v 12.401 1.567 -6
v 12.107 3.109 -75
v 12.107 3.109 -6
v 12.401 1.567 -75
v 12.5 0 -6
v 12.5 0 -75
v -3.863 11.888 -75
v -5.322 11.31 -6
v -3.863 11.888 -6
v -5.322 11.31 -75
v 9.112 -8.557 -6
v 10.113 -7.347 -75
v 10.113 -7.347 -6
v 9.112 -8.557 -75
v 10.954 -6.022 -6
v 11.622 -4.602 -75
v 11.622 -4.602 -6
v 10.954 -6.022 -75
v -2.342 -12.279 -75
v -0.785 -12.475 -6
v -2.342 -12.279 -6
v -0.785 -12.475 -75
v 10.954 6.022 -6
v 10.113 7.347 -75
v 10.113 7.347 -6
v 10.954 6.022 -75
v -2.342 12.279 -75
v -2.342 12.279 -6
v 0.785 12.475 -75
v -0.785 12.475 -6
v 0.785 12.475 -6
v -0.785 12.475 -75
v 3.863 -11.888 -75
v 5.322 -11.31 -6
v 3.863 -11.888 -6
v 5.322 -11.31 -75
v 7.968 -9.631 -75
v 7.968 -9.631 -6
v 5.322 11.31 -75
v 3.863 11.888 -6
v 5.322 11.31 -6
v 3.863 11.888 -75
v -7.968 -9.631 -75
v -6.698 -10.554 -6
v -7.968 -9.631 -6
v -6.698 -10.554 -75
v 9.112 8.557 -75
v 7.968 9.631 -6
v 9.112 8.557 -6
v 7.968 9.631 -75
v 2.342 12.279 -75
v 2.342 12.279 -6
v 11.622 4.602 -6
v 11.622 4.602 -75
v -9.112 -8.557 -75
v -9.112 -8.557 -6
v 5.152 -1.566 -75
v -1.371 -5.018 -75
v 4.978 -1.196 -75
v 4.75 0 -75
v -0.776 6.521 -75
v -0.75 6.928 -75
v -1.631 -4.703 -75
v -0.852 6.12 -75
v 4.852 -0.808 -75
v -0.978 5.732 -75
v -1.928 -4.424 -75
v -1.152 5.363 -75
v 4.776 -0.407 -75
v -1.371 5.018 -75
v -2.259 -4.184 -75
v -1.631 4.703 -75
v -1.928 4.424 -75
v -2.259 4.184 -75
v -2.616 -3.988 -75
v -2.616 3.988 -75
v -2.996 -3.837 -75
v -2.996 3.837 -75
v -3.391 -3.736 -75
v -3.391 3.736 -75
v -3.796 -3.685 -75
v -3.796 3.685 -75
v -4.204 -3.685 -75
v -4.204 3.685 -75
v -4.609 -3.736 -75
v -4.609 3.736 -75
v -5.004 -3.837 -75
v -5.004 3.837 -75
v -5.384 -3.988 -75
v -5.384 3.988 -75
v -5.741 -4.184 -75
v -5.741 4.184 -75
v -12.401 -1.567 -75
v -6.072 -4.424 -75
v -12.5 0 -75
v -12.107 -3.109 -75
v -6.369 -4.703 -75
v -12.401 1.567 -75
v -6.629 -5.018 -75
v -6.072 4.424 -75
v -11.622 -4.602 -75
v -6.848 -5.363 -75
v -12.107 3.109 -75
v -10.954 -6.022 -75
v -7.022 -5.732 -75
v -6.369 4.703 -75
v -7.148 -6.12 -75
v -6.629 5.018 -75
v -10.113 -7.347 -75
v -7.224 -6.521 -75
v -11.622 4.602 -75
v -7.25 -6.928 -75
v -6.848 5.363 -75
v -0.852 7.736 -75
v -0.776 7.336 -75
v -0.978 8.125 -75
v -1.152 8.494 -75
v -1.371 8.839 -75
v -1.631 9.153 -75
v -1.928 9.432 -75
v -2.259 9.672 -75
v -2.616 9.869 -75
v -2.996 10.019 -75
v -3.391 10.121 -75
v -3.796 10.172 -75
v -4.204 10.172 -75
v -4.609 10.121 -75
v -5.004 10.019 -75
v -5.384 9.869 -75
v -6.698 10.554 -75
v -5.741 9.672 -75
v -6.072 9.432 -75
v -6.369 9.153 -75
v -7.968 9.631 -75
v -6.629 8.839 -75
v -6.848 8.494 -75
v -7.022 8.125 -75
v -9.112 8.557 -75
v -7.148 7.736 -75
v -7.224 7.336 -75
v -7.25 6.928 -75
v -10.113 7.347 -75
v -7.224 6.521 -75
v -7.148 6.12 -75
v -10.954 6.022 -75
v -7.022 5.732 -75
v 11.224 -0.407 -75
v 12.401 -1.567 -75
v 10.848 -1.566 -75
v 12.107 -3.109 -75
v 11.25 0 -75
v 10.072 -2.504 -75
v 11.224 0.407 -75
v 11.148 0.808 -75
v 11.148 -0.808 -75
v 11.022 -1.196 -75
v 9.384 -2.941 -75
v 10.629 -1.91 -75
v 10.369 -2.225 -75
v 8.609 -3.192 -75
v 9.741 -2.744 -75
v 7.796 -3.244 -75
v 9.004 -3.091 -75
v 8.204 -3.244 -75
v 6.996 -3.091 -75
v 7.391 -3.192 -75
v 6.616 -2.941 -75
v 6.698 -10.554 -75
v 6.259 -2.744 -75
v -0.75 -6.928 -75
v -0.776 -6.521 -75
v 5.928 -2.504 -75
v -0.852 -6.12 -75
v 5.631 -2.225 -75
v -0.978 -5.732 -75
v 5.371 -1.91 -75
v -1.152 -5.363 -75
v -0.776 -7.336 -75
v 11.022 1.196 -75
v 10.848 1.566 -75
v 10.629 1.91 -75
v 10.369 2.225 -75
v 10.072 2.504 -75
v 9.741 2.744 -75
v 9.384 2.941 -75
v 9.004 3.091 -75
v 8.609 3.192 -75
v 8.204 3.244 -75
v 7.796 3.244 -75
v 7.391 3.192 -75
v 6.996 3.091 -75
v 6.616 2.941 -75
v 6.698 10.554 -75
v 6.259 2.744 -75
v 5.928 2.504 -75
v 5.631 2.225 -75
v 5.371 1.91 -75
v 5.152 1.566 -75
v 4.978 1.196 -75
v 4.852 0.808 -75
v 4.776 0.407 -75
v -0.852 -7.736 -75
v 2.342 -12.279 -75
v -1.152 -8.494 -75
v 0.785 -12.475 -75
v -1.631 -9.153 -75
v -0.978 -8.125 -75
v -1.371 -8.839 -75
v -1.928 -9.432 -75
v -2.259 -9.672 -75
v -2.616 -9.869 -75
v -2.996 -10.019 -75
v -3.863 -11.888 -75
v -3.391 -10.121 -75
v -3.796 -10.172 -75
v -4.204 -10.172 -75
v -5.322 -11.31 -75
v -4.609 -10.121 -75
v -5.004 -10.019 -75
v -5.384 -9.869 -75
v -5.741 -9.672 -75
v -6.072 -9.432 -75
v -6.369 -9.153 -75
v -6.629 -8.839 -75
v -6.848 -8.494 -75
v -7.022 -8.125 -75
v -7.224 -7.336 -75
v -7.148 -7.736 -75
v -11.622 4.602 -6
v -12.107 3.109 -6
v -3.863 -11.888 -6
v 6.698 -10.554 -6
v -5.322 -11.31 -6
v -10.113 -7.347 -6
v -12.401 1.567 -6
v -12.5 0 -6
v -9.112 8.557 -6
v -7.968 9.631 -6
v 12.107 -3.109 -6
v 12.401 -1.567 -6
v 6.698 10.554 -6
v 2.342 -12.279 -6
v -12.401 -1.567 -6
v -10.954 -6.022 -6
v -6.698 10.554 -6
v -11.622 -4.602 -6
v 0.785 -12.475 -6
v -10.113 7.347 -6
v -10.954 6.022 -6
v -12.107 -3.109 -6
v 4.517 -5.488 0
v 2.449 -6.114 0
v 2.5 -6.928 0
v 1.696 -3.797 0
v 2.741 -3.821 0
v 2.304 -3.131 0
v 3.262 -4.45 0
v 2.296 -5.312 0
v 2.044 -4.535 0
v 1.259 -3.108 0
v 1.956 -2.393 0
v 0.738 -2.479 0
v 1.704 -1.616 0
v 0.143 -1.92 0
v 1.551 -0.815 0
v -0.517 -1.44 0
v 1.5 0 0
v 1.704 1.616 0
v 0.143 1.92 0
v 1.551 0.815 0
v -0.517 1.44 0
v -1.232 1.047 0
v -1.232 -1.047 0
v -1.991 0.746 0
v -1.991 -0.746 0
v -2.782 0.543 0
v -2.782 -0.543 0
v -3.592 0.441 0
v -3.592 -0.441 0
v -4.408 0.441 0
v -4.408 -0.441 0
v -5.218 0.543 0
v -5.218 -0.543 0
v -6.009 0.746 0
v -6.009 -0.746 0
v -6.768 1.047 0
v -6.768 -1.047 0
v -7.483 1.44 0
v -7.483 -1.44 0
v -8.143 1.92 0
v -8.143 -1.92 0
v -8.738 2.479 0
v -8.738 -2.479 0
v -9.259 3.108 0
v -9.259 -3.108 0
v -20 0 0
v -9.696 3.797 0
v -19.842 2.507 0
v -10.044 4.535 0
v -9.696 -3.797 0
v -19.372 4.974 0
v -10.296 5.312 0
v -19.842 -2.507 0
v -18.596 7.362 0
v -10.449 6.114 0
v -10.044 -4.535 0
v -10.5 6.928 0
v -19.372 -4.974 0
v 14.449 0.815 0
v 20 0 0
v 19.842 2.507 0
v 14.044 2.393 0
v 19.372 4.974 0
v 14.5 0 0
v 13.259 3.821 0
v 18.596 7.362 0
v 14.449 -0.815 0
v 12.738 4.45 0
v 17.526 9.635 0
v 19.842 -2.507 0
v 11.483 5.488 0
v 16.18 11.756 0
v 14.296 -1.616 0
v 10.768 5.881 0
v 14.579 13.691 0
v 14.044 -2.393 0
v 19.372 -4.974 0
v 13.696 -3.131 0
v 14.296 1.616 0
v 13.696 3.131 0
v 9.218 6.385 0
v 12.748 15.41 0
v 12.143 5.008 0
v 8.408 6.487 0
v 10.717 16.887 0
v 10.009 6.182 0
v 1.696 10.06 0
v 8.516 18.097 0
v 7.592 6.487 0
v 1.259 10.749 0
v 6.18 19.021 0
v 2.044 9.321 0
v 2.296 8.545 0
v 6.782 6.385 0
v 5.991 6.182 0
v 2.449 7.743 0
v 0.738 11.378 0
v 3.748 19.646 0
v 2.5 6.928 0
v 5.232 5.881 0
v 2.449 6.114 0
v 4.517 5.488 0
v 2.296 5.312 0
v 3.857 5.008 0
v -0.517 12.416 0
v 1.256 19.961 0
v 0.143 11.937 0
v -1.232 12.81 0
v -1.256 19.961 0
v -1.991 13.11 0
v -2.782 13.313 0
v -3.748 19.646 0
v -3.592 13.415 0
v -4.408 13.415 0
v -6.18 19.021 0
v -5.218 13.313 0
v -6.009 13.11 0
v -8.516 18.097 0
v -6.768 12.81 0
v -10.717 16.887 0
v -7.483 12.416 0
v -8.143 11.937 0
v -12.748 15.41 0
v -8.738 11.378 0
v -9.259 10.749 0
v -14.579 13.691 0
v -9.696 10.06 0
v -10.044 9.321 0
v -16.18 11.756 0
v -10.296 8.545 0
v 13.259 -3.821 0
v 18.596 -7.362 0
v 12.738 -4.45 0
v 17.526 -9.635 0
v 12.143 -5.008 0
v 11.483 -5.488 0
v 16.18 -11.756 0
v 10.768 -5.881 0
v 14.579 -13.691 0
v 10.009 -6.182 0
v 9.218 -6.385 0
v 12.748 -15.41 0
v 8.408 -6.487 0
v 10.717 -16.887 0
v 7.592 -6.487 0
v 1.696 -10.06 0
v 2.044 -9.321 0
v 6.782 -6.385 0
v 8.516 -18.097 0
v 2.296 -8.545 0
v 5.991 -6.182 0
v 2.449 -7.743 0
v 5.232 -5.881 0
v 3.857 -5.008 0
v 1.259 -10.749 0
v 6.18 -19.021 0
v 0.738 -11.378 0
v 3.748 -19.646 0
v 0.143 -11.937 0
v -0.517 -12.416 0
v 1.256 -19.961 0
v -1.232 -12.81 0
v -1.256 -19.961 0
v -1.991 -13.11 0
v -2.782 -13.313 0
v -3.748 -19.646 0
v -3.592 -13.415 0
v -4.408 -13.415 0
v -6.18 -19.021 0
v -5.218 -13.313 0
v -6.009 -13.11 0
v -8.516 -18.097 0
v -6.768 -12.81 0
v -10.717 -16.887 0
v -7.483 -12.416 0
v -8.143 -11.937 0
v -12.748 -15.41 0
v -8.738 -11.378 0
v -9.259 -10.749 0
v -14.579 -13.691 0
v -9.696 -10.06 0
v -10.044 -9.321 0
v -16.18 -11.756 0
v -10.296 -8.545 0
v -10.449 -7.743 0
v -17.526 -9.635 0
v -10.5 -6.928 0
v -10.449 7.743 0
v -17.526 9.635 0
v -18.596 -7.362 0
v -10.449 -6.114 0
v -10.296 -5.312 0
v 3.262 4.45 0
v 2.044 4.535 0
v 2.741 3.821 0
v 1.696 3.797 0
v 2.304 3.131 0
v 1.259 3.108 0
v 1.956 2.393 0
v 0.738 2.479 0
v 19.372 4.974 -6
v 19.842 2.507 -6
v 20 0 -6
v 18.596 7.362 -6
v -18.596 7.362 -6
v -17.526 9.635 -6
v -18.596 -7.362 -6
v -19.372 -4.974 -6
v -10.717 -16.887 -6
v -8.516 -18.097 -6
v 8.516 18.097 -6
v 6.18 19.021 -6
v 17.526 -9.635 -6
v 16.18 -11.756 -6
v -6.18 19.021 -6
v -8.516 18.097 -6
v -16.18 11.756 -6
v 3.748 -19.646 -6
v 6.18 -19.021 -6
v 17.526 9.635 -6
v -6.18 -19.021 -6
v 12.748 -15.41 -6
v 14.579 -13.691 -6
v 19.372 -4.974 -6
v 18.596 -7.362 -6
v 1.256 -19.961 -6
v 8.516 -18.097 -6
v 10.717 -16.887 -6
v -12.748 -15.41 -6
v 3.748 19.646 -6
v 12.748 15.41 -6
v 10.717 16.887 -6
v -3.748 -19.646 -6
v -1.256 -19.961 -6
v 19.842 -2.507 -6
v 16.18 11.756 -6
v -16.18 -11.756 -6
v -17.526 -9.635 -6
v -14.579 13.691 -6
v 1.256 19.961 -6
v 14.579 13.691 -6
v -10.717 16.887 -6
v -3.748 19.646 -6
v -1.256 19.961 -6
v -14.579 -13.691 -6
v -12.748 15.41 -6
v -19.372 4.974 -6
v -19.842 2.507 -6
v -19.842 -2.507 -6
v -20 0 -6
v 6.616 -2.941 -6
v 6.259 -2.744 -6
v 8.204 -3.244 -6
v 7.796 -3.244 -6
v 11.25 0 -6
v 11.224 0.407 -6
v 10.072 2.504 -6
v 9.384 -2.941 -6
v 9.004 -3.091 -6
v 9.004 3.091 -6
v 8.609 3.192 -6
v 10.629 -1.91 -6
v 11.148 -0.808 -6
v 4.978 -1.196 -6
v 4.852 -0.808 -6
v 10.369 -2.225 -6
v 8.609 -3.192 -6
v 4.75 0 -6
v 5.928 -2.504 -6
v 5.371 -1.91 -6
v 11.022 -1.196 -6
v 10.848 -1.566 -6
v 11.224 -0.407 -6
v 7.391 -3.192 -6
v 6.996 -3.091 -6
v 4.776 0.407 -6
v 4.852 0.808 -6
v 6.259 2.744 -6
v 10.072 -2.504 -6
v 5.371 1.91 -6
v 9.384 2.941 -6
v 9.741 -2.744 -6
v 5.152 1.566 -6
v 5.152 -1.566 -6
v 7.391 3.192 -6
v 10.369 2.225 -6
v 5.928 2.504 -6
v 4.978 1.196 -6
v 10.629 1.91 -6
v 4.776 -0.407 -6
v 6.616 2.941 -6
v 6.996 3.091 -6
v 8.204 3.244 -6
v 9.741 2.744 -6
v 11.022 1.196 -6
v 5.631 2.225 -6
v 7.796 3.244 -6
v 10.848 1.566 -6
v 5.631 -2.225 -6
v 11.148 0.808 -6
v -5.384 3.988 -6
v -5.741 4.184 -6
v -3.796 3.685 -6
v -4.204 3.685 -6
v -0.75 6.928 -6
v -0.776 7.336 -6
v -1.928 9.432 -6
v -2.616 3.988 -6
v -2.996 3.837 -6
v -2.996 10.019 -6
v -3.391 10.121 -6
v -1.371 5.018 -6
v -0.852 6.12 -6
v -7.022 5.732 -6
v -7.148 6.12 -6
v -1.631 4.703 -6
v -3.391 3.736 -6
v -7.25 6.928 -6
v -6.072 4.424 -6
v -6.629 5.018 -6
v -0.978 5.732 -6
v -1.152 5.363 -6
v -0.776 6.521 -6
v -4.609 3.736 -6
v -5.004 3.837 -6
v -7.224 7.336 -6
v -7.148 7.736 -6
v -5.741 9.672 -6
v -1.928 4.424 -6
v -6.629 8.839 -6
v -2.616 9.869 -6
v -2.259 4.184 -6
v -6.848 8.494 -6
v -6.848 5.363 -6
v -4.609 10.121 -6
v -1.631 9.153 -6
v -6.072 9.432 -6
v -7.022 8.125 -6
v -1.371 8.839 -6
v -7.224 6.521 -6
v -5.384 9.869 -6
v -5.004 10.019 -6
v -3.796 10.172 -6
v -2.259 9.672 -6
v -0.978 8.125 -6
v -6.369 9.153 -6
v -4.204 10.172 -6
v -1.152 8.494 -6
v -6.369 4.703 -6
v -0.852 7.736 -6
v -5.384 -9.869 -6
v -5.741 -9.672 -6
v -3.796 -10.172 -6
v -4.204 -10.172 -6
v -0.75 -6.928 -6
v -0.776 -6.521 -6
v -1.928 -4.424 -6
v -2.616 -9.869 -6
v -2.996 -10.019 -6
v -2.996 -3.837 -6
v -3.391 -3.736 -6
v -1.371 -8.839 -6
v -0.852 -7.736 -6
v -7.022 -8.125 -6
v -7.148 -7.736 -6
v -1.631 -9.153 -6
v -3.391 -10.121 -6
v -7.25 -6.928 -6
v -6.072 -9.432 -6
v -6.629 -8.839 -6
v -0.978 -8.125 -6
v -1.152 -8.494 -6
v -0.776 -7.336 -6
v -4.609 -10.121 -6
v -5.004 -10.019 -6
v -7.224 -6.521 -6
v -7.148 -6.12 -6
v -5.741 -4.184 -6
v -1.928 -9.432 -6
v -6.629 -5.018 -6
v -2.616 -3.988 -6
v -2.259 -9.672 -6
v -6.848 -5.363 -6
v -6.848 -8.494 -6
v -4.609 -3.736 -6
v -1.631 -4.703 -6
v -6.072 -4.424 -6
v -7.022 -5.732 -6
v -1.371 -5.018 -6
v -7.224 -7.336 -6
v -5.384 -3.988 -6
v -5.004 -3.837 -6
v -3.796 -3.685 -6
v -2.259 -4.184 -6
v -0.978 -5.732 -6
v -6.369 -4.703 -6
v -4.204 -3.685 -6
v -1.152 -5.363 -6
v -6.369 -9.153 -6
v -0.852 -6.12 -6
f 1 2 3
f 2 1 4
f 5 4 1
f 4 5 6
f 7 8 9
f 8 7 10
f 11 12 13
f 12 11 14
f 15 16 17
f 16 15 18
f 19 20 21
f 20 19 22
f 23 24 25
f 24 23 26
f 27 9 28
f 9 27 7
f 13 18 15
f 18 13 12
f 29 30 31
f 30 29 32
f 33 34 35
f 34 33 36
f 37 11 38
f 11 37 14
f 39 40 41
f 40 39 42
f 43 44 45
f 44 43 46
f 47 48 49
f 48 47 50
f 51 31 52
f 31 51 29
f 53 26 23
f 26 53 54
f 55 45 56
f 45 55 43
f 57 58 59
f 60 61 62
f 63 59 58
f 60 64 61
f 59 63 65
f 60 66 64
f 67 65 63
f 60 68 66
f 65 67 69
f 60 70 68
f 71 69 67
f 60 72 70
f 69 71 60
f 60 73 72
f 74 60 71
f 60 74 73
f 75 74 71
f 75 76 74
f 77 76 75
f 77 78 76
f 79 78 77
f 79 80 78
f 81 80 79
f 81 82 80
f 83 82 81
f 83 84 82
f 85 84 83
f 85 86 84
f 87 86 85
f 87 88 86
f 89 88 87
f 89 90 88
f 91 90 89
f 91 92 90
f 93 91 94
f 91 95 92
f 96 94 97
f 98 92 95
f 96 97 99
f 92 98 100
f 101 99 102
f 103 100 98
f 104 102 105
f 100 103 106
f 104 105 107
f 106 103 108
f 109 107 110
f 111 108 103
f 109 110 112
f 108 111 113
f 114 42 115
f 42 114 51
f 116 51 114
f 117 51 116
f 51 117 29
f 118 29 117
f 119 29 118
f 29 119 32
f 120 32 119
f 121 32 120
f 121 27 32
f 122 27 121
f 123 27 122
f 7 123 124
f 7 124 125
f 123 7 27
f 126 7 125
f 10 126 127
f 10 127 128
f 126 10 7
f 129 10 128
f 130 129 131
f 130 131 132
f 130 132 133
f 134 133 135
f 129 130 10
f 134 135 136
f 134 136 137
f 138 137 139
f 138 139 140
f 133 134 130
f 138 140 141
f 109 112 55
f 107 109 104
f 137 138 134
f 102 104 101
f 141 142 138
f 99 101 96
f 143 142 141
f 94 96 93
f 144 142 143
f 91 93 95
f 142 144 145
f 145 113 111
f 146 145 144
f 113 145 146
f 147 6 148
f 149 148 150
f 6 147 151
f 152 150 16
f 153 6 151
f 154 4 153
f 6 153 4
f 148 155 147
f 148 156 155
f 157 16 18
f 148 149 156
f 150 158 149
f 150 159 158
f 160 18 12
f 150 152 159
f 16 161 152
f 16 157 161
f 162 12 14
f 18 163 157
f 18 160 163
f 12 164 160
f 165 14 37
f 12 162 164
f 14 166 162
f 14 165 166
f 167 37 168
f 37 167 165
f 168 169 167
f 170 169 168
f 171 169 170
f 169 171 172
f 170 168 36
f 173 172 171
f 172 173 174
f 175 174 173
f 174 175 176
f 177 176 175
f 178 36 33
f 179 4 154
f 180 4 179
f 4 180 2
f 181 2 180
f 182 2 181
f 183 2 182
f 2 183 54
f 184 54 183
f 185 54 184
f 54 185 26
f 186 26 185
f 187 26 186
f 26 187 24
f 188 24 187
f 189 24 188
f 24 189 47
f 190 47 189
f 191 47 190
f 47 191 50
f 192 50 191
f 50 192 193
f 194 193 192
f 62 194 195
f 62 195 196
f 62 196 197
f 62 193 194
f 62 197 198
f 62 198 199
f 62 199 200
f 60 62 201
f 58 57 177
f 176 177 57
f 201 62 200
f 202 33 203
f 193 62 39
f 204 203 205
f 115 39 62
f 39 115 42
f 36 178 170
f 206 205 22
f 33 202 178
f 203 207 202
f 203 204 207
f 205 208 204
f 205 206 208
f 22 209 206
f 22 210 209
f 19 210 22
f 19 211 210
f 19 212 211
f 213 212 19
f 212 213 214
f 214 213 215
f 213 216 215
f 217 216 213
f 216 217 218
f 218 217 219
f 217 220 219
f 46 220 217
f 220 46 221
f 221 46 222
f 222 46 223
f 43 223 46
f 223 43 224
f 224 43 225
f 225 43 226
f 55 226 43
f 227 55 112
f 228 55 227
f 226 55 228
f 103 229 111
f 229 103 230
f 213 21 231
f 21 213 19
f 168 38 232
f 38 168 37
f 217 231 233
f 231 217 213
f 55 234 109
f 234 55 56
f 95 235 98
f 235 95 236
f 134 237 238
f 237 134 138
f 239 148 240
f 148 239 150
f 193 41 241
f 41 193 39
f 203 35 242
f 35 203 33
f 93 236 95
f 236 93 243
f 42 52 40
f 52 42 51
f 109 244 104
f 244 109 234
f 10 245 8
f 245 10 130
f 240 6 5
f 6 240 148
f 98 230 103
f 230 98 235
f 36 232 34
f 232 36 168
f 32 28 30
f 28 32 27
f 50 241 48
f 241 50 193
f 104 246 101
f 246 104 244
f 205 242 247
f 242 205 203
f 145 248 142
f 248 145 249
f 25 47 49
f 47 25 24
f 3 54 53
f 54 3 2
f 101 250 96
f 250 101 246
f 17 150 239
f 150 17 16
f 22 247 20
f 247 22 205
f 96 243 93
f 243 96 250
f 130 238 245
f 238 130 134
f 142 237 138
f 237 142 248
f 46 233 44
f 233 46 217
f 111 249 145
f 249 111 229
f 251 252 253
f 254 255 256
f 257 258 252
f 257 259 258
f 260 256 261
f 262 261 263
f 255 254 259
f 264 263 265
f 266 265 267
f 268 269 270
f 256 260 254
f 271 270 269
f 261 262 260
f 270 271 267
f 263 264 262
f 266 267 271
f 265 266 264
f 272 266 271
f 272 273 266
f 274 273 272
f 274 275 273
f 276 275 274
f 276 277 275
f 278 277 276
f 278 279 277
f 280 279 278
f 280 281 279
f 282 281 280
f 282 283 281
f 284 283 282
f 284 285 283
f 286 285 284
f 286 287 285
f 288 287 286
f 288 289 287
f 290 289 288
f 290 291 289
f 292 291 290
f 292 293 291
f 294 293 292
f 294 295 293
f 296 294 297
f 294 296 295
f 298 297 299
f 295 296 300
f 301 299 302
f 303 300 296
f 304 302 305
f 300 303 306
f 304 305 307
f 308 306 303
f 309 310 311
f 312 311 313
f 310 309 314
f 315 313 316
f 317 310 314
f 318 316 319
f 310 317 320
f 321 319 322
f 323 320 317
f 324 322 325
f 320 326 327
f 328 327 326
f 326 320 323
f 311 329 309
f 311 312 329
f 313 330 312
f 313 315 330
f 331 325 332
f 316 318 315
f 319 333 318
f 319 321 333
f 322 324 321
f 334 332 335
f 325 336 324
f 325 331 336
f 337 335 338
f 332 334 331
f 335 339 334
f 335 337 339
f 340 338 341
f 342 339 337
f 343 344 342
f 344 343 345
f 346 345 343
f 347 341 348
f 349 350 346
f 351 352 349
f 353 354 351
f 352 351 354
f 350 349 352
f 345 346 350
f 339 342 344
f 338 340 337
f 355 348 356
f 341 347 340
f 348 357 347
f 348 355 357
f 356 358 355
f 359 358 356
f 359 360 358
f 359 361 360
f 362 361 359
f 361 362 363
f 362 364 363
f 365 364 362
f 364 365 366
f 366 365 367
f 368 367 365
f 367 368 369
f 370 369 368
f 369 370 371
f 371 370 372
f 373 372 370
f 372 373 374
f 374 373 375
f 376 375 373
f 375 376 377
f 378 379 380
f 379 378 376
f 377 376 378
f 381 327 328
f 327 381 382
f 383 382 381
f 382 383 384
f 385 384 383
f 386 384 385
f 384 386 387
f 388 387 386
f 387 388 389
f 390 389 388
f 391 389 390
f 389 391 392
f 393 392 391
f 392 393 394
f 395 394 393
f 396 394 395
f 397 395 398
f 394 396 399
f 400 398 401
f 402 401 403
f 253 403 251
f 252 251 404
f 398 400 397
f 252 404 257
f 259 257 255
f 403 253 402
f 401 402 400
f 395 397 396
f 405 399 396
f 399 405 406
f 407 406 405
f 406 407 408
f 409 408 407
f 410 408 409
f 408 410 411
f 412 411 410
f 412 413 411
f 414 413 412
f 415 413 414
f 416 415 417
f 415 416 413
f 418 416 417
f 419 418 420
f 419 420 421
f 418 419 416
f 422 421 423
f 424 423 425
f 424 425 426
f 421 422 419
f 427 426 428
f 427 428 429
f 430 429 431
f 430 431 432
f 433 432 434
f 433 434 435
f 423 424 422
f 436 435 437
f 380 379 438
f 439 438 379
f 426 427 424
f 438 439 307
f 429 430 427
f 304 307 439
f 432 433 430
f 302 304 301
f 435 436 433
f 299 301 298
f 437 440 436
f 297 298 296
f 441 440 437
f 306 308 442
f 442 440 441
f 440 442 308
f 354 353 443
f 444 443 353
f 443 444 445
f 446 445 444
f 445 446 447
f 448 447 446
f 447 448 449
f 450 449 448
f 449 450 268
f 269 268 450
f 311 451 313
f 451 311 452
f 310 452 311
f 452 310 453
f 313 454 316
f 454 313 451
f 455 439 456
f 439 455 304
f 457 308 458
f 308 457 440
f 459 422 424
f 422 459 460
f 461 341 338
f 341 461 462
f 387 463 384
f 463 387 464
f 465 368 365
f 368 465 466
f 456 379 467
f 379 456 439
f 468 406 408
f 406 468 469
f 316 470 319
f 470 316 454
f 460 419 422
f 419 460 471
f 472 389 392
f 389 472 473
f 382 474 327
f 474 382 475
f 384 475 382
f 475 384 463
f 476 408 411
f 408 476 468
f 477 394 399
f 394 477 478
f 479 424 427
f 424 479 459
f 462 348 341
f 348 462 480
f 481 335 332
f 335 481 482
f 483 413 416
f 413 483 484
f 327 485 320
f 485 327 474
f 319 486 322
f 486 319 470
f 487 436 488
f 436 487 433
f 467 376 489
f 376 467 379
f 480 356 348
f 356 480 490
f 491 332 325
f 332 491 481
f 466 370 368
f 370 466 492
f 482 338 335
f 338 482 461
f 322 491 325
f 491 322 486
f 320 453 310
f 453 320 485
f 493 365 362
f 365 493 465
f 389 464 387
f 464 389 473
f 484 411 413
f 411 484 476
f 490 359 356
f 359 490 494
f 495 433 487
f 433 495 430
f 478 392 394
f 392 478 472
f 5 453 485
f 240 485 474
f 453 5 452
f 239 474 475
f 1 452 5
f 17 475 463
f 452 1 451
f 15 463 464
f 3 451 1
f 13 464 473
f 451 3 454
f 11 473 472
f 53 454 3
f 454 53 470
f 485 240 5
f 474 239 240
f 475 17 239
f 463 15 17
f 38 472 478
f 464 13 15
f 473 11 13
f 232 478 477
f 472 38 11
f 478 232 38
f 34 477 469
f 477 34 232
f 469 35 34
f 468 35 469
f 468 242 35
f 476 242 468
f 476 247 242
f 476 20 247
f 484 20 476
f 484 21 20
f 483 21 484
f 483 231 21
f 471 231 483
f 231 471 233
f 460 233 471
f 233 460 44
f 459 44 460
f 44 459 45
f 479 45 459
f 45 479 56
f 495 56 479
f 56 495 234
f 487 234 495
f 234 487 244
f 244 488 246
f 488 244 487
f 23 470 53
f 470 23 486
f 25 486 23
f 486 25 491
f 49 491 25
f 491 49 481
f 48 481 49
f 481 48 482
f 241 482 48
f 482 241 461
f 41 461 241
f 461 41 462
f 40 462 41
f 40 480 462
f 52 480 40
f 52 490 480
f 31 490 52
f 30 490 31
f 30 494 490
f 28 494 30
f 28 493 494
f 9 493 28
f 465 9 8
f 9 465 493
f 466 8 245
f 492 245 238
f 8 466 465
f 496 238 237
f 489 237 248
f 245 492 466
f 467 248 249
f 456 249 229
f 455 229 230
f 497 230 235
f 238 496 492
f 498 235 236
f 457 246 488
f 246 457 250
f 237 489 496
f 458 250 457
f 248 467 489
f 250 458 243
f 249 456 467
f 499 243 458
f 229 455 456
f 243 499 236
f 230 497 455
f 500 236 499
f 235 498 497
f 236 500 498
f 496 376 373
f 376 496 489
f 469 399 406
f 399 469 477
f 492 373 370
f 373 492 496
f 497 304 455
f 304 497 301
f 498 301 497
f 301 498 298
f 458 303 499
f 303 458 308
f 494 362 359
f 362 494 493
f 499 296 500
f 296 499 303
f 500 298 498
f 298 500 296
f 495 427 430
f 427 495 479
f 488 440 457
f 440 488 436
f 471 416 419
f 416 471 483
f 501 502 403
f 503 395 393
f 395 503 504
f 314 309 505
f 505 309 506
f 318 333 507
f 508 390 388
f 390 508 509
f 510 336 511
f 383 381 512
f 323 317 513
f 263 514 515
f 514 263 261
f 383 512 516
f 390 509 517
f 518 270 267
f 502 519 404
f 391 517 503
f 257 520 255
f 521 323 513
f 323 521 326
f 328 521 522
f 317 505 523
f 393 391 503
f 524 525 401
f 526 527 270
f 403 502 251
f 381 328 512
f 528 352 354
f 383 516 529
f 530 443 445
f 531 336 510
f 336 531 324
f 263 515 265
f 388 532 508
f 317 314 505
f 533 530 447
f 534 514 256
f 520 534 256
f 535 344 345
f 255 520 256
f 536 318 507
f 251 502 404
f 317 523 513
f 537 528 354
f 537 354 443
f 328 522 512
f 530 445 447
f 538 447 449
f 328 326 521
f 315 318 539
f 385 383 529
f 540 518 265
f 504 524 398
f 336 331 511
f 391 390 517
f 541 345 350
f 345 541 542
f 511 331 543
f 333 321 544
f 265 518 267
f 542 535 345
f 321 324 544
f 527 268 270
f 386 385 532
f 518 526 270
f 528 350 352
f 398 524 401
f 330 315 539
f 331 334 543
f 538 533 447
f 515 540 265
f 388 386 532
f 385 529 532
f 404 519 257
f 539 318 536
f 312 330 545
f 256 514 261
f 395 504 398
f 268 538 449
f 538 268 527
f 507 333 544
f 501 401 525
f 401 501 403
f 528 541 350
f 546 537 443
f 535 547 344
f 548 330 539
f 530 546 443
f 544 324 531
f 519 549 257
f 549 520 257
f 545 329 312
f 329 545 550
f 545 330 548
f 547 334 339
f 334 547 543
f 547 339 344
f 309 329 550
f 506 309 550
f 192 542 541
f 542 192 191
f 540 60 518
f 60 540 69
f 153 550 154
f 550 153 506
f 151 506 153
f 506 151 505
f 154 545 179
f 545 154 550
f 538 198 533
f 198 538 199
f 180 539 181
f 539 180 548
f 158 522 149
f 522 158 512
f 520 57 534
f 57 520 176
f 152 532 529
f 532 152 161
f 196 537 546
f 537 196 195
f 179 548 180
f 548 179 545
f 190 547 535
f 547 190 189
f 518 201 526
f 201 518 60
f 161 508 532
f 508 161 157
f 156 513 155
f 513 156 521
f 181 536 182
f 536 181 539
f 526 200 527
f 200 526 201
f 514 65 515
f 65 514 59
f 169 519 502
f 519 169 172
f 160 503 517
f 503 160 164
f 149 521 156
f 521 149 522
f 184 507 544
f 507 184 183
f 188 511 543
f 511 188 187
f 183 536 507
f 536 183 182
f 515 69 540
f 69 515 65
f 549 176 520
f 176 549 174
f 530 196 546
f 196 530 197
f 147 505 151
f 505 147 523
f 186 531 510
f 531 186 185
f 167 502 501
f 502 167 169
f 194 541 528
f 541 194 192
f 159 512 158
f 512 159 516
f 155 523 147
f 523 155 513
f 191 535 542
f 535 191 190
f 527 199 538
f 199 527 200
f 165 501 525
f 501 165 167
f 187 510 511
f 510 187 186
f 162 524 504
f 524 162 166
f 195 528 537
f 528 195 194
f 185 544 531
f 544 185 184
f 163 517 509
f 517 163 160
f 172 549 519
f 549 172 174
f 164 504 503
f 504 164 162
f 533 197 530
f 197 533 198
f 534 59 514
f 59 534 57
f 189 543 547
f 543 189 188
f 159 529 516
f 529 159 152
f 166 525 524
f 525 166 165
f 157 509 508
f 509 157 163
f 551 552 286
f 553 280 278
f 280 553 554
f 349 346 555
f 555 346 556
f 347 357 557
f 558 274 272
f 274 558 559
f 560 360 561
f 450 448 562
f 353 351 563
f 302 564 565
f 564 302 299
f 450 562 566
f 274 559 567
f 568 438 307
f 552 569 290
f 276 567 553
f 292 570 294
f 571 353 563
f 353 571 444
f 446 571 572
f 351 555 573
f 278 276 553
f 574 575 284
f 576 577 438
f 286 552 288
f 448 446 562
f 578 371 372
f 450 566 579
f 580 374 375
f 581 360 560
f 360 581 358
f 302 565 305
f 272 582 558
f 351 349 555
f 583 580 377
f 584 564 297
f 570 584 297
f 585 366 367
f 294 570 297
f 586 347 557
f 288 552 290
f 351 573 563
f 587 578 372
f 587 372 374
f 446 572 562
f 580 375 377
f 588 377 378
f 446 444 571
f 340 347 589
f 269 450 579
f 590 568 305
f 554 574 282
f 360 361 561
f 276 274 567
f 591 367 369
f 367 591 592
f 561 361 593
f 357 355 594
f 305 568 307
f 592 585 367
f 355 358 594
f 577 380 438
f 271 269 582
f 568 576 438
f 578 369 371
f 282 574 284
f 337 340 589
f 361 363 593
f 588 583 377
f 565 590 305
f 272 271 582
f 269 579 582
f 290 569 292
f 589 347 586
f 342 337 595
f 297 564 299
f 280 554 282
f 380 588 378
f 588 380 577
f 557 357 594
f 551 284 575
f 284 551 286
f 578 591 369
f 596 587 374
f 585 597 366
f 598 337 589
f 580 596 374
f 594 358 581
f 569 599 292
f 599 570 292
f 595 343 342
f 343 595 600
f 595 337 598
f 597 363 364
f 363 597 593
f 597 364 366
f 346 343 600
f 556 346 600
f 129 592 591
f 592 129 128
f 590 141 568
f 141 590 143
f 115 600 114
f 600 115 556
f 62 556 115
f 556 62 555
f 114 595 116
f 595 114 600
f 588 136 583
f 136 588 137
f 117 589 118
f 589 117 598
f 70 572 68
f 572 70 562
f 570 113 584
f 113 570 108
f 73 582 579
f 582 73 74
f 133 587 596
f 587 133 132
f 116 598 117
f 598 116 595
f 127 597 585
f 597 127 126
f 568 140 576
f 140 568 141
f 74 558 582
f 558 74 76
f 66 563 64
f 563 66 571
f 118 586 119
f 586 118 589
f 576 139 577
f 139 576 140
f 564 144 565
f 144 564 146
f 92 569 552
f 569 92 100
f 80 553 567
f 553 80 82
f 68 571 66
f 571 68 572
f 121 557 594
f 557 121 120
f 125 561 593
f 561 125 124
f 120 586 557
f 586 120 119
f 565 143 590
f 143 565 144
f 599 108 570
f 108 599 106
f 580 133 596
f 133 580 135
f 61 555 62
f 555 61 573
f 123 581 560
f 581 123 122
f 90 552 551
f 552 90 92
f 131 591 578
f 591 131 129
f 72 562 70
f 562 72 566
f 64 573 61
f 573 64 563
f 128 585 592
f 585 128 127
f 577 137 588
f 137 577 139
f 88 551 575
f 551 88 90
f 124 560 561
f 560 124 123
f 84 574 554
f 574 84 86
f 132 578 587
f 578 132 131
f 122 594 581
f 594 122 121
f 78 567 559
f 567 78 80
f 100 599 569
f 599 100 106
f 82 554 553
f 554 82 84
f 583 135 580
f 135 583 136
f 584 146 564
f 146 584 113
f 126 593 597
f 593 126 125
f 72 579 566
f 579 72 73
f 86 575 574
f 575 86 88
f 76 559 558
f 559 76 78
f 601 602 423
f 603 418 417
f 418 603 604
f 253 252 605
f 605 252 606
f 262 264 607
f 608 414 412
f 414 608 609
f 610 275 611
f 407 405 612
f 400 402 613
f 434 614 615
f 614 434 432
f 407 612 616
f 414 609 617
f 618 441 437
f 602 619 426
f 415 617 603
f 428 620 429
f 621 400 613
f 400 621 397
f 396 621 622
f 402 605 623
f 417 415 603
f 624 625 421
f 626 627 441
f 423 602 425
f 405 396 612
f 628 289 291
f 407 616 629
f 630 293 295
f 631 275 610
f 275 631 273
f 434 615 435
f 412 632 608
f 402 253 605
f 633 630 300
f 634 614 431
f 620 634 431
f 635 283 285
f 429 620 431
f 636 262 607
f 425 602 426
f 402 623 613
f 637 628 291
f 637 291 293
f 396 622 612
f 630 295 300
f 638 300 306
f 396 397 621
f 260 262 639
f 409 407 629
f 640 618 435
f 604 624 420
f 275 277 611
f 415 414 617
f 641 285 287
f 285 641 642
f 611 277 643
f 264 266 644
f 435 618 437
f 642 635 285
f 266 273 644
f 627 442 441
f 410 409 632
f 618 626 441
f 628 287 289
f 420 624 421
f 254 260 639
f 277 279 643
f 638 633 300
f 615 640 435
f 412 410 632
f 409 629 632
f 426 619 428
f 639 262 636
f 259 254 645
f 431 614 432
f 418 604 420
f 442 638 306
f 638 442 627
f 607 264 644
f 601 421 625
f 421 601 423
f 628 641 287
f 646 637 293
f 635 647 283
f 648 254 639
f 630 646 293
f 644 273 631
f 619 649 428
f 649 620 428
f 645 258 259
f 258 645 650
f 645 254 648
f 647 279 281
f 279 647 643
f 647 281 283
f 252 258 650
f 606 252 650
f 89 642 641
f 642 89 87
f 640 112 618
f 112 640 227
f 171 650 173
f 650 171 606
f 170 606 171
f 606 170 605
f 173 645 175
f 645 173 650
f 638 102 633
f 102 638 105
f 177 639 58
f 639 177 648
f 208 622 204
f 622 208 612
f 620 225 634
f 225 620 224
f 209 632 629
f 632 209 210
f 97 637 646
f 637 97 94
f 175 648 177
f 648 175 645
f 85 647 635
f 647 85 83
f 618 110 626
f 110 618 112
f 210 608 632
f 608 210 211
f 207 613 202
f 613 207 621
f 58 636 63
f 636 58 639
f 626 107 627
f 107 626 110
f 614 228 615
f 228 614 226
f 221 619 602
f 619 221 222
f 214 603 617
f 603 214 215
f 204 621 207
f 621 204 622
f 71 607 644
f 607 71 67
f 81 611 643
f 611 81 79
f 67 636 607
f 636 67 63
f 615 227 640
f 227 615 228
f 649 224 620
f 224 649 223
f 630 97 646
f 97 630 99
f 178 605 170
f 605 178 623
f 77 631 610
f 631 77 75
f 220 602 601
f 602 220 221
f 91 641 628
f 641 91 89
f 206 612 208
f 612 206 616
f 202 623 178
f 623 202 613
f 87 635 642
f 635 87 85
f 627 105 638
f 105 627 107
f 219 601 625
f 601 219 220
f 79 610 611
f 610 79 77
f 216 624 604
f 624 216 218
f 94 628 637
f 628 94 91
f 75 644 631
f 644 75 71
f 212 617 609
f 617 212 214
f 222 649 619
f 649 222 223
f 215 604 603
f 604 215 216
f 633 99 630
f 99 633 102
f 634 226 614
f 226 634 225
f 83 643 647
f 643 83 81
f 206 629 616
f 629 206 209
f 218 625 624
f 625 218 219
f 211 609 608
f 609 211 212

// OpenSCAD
$fn = 50;


difference() {
	union() {
		translate(v = [0, 0, -75.0000000000]) {
			cylinder(h = 75, r = 12.5000000000);
		}
		translate(v = [0, 0, -6.0000000000]) {
			cylinder(h = 6, r = 20.0000000000);
		}
	}
	union() {
		translate(v = [8.0000000000, 0.0000000000, 0]) {
			rotate(a = [0, 0, 0]) {
				difference() {
					union() {
						#translate(v = [0, 0, -75.0000000000]) {
							cylinder(h = 75, r = 2.2500000000);
						}
						#translate(v = [0, 0, -6]) {
							cylinder(h = 6, r = 12.5000000000, r1 = 3.2500000000, r2 = 6.5000000000);
						}
						#translate(v = [0, 0, -75.0000000000]) {
							cylinder(h = 75, r = 3.2500000000);
						}
						#translate(v = [0, 0, -75.0000000000]) {
							cylinder(h = 75, r = 2.2500000000);
						}
					}
					union();
				}
			}
		}
		translate(v = [-4.0000000000, 6.9282032303, 0]) {
			rotate(a = [0, 0, 0]) {
				difference() {
					union() {
						#translate(v = [0, 0, -75.0000000000]) {
							cylinder(h = 75, r = 2.2500000000);
						}
						#translate(v = [0, 0, -6]) {
							cylinder(h = 6, r = 12.5000000000, r1 = 3.2500000000, r2 = 6.5000000000);
						}
						#translate(v = [0, 0, -75.0000000000]) {
							cylinder(h = 75, r = 3.2500000000);
						}
						#translate(v = [0, 0, -75.0000000000]) {
							cylinder(h = 75, r = 2.2500000000);
						}
					}
					union();
				}
			}
		}
		translate(v = [-4.0000000000, -6.9282032303, 0]) {
			rotate(a = [0, 0, 0]) {
				difference() {
					union() {
						#translate(v = [0, 0, -75.0000000000]) {
							cylinder(h = 75, r = 2.2500000000);
						}
						#translate(v = [0, 0, -6]) {
							cylinder(h = 6, r = 12.5000000000, r1 = 3.2500000000, r2 = 6.5000000000);
						}
						#translate(v = [0, 0, -75.0000000000]) {
							cylinder(h = 75, r = 3.2500000000);
						}
						#translate(v = [0, 0, -75.0000000000]) {
							cylinder(h = 75, r = 2.2500000000);
						}
					}
					union();
				}
			}
		}
	}
}
